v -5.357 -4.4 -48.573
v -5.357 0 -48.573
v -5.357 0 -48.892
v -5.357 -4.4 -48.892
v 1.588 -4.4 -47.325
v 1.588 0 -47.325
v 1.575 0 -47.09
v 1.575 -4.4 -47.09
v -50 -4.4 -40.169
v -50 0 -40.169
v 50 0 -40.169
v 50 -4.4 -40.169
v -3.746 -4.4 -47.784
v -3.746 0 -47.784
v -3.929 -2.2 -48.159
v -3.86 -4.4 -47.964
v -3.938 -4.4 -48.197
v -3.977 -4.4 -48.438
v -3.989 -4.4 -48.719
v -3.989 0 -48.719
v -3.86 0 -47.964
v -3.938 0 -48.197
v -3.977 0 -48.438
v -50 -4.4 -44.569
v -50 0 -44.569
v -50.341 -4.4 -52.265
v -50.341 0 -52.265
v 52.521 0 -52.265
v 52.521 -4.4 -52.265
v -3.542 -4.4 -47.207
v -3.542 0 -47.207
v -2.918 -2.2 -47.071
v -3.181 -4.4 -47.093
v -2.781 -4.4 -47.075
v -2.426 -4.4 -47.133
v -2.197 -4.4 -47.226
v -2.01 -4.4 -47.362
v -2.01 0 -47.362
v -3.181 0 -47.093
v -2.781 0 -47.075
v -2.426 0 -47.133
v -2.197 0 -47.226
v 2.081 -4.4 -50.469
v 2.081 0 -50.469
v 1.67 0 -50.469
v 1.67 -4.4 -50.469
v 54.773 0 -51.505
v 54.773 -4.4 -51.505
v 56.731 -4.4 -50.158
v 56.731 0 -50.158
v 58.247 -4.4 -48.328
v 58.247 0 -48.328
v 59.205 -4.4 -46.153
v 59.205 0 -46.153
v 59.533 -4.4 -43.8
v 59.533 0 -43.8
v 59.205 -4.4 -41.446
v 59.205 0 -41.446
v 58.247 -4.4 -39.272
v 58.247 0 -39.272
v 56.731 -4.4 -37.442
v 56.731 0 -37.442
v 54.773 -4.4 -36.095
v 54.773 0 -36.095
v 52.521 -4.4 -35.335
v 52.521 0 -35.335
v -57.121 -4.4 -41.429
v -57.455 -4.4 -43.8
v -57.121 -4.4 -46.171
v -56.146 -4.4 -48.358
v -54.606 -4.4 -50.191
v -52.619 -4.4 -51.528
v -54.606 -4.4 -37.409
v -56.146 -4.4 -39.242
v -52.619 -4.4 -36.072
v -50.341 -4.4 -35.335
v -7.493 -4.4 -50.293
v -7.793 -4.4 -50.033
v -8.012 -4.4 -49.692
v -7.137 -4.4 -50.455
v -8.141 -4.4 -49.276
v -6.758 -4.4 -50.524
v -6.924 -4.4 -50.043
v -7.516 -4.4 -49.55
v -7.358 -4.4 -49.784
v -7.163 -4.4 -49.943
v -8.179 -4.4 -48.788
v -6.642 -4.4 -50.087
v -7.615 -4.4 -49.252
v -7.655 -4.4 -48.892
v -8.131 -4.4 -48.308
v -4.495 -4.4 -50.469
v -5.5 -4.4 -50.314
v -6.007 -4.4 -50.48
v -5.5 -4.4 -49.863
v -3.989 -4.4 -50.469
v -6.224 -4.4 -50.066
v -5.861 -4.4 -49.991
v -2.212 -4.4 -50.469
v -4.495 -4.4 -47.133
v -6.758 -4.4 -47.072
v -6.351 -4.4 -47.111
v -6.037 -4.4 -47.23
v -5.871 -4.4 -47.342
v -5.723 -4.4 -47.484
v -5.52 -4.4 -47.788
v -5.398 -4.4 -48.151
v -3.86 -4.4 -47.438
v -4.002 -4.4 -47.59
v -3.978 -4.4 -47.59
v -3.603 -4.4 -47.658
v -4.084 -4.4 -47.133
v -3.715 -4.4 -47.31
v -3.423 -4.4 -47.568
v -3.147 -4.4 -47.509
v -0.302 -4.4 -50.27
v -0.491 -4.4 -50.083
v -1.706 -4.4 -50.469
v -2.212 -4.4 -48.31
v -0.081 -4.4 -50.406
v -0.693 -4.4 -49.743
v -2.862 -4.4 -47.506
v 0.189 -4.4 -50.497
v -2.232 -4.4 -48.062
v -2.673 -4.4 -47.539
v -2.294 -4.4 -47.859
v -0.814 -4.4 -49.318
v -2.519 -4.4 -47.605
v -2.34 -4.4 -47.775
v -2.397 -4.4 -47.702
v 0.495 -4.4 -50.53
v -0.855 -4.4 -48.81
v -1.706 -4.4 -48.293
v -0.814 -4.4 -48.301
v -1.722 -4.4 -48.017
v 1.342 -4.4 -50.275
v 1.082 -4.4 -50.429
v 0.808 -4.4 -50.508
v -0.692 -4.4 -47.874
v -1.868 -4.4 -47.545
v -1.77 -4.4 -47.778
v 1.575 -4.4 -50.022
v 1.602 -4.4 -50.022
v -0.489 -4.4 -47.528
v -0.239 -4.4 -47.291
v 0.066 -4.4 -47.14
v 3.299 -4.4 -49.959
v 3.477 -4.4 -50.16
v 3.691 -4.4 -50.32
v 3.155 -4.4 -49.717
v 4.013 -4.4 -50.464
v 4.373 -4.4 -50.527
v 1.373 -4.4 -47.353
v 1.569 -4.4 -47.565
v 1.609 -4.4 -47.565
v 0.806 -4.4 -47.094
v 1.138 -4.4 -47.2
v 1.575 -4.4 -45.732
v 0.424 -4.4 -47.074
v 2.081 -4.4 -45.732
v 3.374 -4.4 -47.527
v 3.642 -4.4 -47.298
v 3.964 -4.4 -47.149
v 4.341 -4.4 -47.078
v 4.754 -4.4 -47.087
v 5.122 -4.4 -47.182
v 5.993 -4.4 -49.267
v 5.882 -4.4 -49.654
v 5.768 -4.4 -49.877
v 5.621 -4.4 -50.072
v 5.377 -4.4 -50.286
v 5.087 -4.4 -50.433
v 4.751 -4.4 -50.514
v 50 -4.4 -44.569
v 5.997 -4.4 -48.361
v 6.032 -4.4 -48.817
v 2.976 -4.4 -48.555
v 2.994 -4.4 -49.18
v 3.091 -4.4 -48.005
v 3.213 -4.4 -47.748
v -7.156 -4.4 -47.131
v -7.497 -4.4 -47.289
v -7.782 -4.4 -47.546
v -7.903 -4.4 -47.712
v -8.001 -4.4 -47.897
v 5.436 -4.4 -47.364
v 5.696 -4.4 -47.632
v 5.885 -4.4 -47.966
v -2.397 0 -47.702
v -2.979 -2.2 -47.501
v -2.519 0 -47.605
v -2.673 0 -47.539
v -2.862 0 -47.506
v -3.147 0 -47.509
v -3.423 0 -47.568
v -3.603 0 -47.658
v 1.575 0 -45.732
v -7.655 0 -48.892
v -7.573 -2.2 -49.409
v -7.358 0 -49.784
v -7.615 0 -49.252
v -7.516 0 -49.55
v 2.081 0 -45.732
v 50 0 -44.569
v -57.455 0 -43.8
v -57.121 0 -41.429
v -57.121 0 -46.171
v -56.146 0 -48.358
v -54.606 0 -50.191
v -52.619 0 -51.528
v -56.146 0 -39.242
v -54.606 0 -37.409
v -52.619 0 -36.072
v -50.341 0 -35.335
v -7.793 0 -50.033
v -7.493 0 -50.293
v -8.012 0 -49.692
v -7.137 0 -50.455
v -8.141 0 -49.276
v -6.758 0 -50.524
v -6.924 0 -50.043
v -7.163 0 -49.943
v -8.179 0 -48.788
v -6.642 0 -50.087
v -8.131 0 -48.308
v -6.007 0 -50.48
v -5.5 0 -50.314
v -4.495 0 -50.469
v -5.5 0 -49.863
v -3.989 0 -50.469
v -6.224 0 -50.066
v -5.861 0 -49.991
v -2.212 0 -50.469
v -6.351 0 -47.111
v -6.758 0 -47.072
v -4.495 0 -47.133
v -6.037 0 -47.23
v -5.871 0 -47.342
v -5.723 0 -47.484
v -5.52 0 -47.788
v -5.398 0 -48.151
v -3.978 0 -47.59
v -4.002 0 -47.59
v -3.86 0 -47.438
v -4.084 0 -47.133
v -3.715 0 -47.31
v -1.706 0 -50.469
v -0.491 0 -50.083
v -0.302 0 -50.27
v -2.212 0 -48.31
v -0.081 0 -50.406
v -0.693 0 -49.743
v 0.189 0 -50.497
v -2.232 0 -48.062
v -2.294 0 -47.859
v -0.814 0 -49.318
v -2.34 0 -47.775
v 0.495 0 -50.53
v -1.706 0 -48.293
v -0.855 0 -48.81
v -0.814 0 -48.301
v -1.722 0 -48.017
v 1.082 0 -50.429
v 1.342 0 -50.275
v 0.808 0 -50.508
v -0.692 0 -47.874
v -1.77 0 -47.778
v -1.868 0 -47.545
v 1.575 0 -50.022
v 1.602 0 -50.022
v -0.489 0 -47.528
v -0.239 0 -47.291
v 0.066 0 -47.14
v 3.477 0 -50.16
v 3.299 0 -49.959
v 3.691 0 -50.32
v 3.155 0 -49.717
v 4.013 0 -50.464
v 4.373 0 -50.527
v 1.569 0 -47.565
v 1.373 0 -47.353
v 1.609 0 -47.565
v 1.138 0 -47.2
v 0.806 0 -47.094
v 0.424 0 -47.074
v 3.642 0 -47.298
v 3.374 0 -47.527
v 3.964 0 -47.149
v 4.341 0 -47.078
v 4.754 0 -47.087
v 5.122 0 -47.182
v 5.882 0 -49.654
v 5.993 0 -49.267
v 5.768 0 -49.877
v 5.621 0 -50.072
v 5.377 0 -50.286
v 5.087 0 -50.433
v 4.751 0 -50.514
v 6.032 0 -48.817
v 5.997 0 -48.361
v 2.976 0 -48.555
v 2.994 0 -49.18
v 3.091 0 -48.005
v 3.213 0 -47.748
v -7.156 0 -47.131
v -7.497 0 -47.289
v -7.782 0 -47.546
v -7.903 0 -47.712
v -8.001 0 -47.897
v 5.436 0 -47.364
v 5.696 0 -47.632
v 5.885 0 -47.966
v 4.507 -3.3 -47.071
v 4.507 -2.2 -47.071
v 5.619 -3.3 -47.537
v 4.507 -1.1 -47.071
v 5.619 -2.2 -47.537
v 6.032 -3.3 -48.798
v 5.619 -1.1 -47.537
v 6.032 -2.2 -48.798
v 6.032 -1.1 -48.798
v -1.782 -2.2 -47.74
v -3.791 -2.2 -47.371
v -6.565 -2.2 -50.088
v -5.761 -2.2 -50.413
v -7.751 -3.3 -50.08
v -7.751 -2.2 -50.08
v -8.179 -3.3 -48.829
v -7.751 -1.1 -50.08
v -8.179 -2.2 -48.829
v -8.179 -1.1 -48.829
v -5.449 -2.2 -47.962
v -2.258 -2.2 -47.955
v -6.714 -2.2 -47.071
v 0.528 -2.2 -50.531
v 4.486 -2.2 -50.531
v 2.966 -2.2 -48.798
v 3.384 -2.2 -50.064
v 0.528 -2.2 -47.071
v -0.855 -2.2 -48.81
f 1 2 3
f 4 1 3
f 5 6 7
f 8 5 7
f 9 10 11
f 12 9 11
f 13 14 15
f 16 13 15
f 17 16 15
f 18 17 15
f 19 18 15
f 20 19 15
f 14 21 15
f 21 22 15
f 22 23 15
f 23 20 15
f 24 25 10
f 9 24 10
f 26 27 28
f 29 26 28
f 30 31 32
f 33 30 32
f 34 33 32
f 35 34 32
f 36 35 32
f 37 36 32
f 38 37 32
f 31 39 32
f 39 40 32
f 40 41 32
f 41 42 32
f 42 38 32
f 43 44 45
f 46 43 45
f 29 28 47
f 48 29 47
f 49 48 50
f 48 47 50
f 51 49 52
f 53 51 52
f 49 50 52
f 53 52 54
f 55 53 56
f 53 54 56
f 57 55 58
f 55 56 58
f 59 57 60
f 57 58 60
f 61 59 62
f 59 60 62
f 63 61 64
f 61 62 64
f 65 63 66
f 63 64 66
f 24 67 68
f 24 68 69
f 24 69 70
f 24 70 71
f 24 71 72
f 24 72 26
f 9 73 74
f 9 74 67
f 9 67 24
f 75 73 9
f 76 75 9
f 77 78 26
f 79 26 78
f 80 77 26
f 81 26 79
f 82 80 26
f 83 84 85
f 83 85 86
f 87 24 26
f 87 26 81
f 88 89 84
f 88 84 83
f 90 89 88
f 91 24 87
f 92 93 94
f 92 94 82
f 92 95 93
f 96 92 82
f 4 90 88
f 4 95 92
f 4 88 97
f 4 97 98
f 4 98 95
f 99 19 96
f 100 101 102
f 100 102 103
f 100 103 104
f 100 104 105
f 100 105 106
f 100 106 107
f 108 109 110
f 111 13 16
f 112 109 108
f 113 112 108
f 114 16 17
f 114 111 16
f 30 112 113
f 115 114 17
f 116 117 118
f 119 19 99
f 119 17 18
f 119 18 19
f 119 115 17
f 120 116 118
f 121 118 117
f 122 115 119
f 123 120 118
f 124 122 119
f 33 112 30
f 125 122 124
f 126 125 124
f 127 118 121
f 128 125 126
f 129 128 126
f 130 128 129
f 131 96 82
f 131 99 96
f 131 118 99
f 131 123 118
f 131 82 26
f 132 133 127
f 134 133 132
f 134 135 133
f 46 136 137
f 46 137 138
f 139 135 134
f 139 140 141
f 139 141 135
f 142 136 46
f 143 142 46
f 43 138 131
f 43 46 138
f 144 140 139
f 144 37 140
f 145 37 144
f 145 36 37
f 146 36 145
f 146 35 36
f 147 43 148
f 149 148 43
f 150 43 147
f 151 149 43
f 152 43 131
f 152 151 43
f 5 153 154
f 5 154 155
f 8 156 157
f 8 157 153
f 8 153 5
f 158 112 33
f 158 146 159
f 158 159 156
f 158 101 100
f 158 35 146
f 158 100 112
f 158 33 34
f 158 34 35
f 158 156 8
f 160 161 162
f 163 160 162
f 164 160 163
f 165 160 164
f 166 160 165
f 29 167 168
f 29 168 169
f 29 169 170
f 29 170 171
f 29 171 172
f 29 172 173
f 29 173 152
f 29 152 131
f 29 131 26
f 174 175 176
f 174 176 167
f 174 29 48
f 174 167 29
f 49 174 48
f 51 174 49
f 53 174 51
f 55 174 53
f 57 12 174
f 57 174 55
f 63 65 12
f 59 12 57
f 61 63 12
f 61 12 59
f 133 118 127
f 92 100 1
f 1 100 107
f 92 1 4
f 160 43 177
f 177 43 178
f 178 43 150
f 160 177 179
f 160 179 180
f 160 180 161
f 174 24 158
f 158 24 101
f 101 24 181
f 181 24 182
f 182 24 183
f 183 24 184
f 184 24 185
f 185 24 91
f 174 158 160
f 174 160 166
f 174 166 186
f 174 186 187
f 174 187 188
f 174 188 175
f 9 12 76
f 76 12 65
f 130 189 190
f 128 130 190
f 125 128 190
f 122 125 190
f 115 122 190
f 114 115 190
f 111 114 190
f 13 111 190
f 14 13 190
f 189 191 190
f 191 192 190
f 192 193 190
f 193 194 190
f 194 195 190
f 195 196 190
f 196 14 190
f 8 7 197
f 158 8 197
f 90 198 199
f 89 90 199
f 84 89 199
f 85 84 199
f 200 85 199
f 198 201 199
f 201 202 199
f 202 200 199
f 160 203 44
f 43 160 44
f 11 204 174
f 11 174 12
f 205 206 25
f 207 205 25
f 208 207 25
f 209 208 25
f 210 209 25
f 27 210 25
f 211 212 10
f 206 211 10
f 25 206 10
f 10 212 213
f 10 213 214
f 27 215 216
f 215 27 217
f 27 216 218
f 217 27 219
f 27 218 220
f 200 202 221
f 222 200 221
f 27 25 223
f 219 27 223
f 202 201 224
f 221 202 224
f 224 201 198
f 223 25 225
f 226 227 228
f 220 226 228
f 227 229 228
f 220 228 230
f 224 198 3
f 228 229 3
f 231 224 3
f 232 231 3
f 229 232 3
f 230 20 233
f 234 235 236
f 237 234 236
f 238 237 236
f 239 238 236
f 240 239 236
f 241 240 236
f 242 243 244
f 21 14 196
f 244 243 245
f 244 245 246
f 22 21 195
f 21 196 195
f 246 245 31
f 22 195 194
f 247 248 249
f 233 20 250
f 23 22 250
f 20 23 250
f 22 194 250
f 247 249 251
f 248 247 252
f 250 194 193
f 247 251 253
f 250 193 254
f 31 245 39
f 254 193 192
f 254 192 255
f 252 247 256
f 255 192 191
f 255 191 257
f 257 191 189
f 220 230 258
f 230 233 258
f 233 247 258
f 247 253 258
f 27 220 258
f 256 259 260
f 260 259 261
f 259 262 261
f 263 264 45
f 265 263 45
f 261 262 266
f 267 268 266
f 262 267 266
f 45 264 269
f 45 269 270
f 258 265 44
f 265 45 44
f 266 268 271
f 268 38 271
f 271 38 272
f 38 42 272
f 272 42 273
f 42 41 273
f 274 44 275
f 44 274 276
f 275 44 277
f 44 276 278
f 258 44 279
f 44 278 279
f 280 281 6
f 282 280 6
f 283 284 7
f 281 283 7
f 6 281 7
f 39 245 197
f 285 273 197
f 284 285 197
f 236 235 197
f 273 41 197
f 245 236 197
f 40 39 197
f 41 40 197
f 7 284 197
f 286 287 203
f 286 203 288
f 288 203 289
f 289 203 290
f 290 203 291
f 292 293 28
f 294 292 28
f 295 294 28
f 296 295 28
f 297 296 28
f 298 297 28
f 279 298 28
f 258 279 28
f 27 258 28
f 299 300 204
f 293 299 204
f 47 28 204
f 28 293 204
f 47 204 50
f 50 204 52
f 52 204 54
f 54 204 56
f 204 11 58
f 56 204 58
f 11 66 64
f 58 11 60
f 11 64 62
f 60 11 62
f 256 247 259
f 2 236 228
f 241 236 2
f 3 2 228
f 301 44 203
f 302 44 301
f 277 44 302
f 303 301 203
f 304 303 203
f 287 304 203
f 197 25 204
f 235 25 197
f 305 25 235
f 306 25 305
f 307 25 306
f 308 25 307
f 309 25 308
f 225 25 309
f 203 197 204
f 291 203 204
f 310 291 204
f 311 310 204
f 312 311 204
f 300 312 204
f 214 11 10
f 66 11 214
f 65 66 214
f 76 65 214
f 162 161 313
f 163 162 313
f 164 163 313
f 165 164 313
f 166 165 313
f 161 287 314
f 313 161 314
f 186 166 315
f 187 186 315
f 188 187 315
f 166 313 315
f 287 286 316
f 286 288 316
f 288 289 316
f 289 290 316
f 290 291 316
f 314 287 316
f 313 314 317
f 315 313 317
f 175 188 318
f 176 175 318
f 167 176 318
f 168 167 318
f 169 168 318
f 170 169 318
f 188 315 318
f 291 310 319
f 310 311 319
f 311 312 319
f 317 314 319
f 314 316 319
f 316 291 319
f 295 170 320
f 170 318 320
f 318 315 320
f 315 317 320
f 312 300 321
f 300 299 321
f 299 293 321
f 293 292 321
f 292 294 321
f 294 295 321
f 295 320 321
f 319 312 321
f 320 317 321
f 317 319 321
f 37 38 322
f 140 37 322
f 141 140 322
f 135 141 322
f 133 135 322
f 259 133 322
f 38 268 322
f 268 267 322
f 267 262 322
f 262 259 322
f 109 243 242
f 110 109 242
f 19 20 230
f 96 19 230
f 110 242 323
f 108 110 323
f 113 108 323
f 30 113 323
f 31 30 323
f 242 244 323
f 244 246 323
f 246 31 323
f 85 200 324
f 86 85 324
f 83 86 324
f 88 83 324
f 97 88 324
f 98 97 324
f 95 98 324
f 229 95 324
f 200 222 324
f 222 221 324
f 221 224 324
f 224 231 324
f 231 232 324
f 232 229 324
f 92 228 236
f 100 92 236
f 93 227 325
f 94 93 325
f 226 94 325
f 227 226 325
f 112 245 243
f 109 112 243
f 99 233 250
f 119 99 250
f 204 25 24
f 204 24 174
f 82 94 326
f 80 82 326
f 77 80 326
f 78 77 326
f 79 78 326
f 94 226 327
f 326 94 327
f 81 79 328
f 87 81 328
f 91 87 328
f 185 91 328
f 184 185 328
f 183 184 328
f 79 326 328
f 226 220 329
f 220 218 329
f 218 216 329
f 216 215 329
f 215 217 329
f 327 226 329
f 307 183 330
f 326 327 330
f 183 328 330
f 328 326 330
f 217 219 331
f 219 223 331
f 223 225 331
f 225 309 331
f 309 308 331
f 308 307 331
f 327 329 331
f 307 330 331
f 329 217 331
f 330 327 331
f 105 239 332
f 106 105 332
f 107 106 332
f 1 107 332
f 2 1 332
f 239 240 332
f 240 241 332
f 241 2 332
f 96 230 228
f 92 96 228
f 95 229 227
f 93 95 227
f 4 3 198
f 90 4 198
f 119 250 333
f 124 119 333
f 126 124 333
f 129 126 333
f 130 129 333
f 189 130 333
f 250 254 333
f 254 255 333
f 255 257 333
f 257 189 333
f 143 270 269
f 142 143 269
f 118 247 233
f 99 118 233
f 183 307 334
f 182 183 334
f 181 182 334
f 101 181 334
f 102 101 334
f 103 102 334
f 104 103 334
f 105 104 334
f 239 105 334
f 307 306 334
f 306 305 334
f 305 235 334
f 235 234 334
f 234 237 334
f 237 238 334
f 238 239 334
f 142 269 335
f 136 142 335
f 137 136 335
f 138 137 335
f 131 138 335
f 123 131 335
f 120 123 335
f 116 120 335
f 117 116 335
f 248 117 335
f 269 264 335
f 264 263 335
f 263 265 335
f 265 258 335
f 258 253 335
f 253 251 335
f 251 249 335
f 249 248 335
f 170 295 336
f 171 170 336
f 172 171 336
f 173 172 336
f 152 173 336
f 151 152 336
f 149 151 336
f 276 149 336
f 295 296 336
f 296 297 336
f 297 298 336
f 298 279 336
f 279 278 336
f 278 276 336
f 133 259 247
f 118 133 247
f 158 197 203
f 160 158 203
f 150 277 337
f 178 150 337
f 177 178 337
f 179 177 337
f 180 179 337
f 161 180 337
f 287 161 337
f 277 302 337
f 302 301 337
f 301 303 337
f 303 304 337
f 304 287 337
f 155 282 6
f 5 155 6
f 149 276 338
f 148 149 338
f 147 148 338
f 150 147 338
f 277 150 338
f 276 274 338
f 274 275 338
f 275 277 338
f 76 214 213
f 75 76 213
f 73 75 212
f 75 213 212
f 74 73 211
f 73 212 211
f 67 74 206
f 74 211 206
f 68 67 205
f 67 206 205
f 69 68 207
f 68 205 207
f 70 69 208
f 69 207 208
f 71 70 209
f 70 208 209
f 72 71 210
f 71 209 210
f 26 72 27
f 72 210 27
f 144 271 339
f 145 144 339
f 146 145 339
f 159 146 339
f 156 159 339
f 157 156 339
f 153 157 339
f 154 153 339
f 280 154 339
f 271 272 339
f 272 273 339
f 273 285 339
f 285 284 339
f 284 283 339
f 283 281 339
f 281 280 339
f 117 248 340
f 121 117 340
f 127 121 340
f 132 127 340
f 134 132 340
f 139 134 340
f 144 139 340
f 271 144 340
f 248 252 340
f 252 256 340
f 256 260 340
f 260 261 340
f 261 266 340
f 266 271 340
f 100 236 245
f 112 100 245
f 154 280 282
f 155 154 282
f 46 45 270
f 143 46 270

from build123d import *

# Parameters (mm, degrees)
F0_W     = 100
F0_H     = 4.4
F1_DEPTH = 4.4


with BuildPart() as f1:
    # F0 (on Front) → F1 (new body)
    with BuildSketch(Plane.XZ):
        with BuildLine():
            Line((52.5213778019, -35.3348962963), (-50.3410026431, -35.3348962963))
            ThreePointArc((-50.3410026431, -35.3348962963), (-57.4545573502, -43.799880892), (-50.3410026431, -52.2648654878))
            Line((-50.3410026431, -52.2648654878), (52.5213778019, -52.2648654878))
            ThreePointArc((52.5213778019, -52.2648654878), (59.5325622156, -43.799880892), (52.5213778019, -35.3348962963))
        make_face()
        with BuildLine():
            add(Edge.make_bspline(
                [(-6.0069680161, -50.4799766115), (-6.2456414194, -50.5306338237), (-6.5836808927, -50.5306338237)],
                knots=[0, 0, 0, 1, 1, 1], degree=2))
            add(Edge.make_bspline(
                [(-6.5836808927, -50.5306338237), (-7.3230813545, -50.5306338237), (-7.7512322148, -50.0795898002)],
                knots=[0, 0, 0, 1, 1, 1], degree=2))
            add(Edge.make_bspline(
                [(-7.7512322148, -50.0795898002), (-8.1793830751, -49.6285457767), (-8.1793830751, -48.8287463312)],
                knots=[0, 0, 0, 1, 1, 1], degree=2))
            add(Edge.make_bspline(
                [(-8.1793830751, -48.8287463312), (-8.1793830751, -48.0211534685), (-7.7819187952, -47.5462421046)],
                knots=[0, 0, 0, 1, 1, 1], degree=2))
            add(Edge.make_bspline(
                [(-7.7819187952, -47.5462421046), (-7.3844545154, -47.0713307408), (-6.7142206317, -47.0713307408)],
                knots=[0, 0, 0, 1, 1, 1], degree=2))
            add(Edge.make_bspline(
                [(-6.7142206317, -47.0713307408), (-6.08782472, -47.0713307408), (-5.7225082864, -47.4838947666)],
                knots=[0, 0, 0, 1, 1, 1], degree=2))
            add(Edge.make_bspline(
                [(-5.7225082864, -47.4838947666), (-5.3571918527, -47.8964587924), (-5.3571918527, -48.572537739)],
                knots=[0, 0, 0, 1, 1, 1], degree=2))
            Line((-5.3571918527, -48.572537739), (-5.3571918527, -48.8920678464))
            Line((-5.3571918527, -48.8920678464), (-7.6552757649, -48.8920678464))
            add(Edge.make_bspline(
                [(-7.6552757649, -48.8920678464), (-7.6396889304, -49.4794966718), (-7.3581517322, -49.7839270332)],
                knots=[0, 0, 0, 1, 1, 1], degree=2))
            add(Edge.make_bspline(
                [(-7.3581517322, -49.7839270332), (-7.0766145339, -50.0883573946), (-6.5651715267, -50.0883573946)],
                knots=[0, 0, 0, 1, 1, 1], degree=2))
            add(Edge.make_bspline(
                [(-6.5651715267, -50.0883573946), (-6.0264515592, -50.0883573946), (-5.5003958947, -49.8633224714)],
                knots=[0, 0, 0, 1, 1, 1], degree=2))
            Line((-5.5003958947, -49.8633224714), (-5.5003958947, -50.3143664949))
            add(Edge.make_bspline(
                [(-5.5003958947, -50.3143664949), (-5.7682946127, -50.4293193994), (-6.0069680161, -50.4799766115)],
                knots=[0, 0, 0, 1, 1, 1], degree=2))
        make_face(mode=Mode.SUBTRACT)
        with BuildLine():
            Line((-1.70597587, -50.4692606628), (-2.2115738142, -50.4692606628))
            Line((-2.2115738142, -50.4692606628), (-2.2115738142, -48.3104840839))
            add(Edge.make_bspline(
                [(-2.2115738142, -48.3104840839), (-2.2115738142, -47.9032780325), (-2.3971545626, -47.7021104497)],
                knots=[0, 0, 0, 1, 1, 1], degree=2))
            add(Edge.make_bspline(
                [(-2.3971545626, -47.7021104497), (-2.5827353109, -47.5009428669), (-2.9792254136, -47.5009428669)],
                knots=[0, 0, 0, 1, 1, 1], degree=2))
            add(Edge.make_bspline(
                [(-2.9792254136, -47.5009428669), (-3.5023585466, -47.5009428669), (-3.7459028358, -47.7839413308)],
                knots=[0, 0, 0, 1, 1, 1], degree=2))
            add(Edge.make_bspline(
                [(-3.7459028358, -47.7839413308), (-3.9894471249, -48.0669397948), (-3.9894471249, -48.7186643125)],
                knots=[0, 0, 0, 1, 1, 1], degree=2))
            Line((-3.9894471249, -48.7186643125), (-3.9894471249, -50.4692606628))
            Line((-3.9894471249, -50.4692606628), (-4.4950450691, -50.4692606628))
            Line((-4.4950450691, -50.4692606628), (-4.4950450691, -47.1327039017))
            Line((-4.4950450691, -47.1327039017), (-4.0839423091, -47.1327039017))
            Line((-4.0839423091, -47.1327039017), (-4.0021114279, -47.5895929881))
            Line((-4.0021114279, -47.5895929881), (-3.977756999, -47.5895929881))
            add(Edge.make_bspline(
                [(-3.977756999, -47.5895929881), (-3.821888654, -47.3431261675), (-3.5418127215, -47.2072284542)],
                knots=[0, 0, 0, 1, 1, 1], degree=2))
            add(Edge.make_bspline(
                [(-3.5418127215, -47.2072284542), (-3.261736789, -47.0713307408), (-2.9178522527, -47.0713307408)],
                knots=[0, 0, 0, 1, 1, 1], degree=2))
            add(Edge.make_bspline(
                [(-2.9178522527, -47.0713307408), (-2.3148365928, -47.0713307408), (-2.0104062314, -47.3621226221)],
                knots=[0, 0, 0, 1, 1, 1], degree=2))
            add(Edge.make_bspline(
                [(-2.0104062314, -47.3621226221), (-1.70597587, -47.6529145033), (-1.70597587, -48.2929488951)],
                knots=[0, 0, 0, 1, 1, 1], degree=2))
            Line((-1.70597587, -48.2929488951), (-1.70597587, -50.4692606628))
        make_face(mode=Mode.SUBTRACT)
        with BuildLine():
            Line((1.6695479773, -50.4692606628), (1.6023297535, -50.0221133479))
            Line((1.6023297535, -50.0221133479), (1.5750527932, -50.0221133479))
            add(Edge.make_bspline(
                [(1.5750527932, -50.0221133479), (1.225323194, -50.5306338237), (0.5278123499, -50.5306338237)],
                knots=[0, 0, 0, 1, 1, 1], degree=2))
            add(Edge.make_bspline(
                [(0.5278123499, -50.5306338237), (-0.1268346993, -50.5306338237), (-0.4906898672, -50.0829994202)],
                knots=[0, 0, 0, 1, 1, 1], degree=2))
            add(Edge.make_bspline(
                [(-0.4906898672, -50.0829994202), (-0.8545450352, -49.6353650168), (-0.8545450352, -48.8102369652)],
                knots=[0, 0, 0, 1, 1, 1], degree=2))
            add(Edge.make_bspline(
                [(-0.8545450352, -48.8102369652), (-0.8545450352, -47.9851089137), (-0.4892286015, -47.5282198273)],
                knots=[0, 0, 0, 1, 1, 1], degree=2))
            add(Edge.make_bspline(
                [(-0.4892286015, -47.5282198273), (-0.1239121678, -47.0713307408), (0.5278123499, -47.0713307408)],
                knots=[0, 0, 0, 1, 1, 1], degree=2))
            add(Edge.make_bspline(
                [(0.5278123499, -47.0713307408), (1.206813828, -47.0713307408), (1.5692077302, -47.5652385592)],
                knots=[0, 0, 0, 1, 1, 1], degree=2))
            Line((1.5692077302, -47.5652385592), (1.6091489936, -47.5652385592))
            Line((1.6091489936, -47.5652385592), (1.5877170962, -47.3246168015))
            Line((1.5877170962, -47.3246168015), (1.5750527932, -47.0898401068))
            Line((1.5750527932, -47.0898401068), (1.5750527932, -45.7318371506))
            Line((1.5750527932, -45.7318371506), (2.0806507374, -45.7318371506))
            Line((2.0806507374, -45.7318371506), (2.0806507374, -50.4692606628))
            Line((2.0806507374, -50.4692606628), (1.6695479773, -50.4692606628))
        make_face(mode=Mode.SUBTRACT)
        with Locations((0, -42.3694215596)):
            Rectangle(F0_W, F0_H, mode=Mode.SUBTRACT)
        with BuildLine():
            add(Edge.make_bspline(
                [(5.6193492585, -47.5374745102), (6.0319132843, -48.0036182796), (6.0319132843, -48.7975726622)],
                knots=[0, 0, 0, 1, 1, 1], degree=2))
            add(Edge.make_bspline(
                [(6.0319132843, -48.7975726622), (6.0319132843, -49.6139331194), (5.6212976128, -50.0722834715)],
                knots=[0, 0, 0, 1, 1, 1], degree=2))
            add(Edge.make_bspline(
                [(5.6212976128, -50.0722834715), (5.2106819413, -50.5306338237), (4.4858941369, -50.5306338237)],
                knots=[0, 0, 0, 1, 1, 1], degree=2))
            add(Edge.make_bspline(
                [(4.4858941369, -50.5306338237), (4.0377726449, -50.5306338237), (3.6909655771, -50.3202115578)],
                knots=[0, 0, 0, 1, 1, 1], degree=2))
            add(Edge.make_bspline(
                [(3.6909655771, -50.3202115578), (3.3441585094, -50.109789292), (3.155168141, -49.717195898)],
                knots=[0, 0, 0, 1, 1, 1], degree=2))
            add(Edge.make_bspline(
                [(3.155168141, -49.717195898), (2.9661777727, -49.3246025039), (2.9661777727, -48.7975726622)],
                knots=[0, 0, 0, 1, 1, 1], degree=2))
            add(Edge.make_bspline(
                [(2.9661777727, -48.7975726622), (2.9661777727, -47.9821863822), (3.3743580013, -47.5267585615)],
                knots=[0, 0, 0, 1, 1, 1], degree=2))
            add(Edge.make_bspline(
                [(3.3743580013, -47.5267585615), (3.7825382298, -47.0713307408), (4.5073260343, -47.0713307408)],
                knots=[0, 0, 0, 1, 1, 1], degree=2))
            add(Edge.make_bspline(
                [(4.5073260343, -47.0713307408), (5.2067852327, -47.0713307408), (5.6193492585, -47.5374745102)],
                knots=[0, 0, 0, 1, 1, 1], degree=2))
        make_face(mode=Mode.SUBTRACT)
    extrude(amount=F1_DEPTH)


solid = f1.part
